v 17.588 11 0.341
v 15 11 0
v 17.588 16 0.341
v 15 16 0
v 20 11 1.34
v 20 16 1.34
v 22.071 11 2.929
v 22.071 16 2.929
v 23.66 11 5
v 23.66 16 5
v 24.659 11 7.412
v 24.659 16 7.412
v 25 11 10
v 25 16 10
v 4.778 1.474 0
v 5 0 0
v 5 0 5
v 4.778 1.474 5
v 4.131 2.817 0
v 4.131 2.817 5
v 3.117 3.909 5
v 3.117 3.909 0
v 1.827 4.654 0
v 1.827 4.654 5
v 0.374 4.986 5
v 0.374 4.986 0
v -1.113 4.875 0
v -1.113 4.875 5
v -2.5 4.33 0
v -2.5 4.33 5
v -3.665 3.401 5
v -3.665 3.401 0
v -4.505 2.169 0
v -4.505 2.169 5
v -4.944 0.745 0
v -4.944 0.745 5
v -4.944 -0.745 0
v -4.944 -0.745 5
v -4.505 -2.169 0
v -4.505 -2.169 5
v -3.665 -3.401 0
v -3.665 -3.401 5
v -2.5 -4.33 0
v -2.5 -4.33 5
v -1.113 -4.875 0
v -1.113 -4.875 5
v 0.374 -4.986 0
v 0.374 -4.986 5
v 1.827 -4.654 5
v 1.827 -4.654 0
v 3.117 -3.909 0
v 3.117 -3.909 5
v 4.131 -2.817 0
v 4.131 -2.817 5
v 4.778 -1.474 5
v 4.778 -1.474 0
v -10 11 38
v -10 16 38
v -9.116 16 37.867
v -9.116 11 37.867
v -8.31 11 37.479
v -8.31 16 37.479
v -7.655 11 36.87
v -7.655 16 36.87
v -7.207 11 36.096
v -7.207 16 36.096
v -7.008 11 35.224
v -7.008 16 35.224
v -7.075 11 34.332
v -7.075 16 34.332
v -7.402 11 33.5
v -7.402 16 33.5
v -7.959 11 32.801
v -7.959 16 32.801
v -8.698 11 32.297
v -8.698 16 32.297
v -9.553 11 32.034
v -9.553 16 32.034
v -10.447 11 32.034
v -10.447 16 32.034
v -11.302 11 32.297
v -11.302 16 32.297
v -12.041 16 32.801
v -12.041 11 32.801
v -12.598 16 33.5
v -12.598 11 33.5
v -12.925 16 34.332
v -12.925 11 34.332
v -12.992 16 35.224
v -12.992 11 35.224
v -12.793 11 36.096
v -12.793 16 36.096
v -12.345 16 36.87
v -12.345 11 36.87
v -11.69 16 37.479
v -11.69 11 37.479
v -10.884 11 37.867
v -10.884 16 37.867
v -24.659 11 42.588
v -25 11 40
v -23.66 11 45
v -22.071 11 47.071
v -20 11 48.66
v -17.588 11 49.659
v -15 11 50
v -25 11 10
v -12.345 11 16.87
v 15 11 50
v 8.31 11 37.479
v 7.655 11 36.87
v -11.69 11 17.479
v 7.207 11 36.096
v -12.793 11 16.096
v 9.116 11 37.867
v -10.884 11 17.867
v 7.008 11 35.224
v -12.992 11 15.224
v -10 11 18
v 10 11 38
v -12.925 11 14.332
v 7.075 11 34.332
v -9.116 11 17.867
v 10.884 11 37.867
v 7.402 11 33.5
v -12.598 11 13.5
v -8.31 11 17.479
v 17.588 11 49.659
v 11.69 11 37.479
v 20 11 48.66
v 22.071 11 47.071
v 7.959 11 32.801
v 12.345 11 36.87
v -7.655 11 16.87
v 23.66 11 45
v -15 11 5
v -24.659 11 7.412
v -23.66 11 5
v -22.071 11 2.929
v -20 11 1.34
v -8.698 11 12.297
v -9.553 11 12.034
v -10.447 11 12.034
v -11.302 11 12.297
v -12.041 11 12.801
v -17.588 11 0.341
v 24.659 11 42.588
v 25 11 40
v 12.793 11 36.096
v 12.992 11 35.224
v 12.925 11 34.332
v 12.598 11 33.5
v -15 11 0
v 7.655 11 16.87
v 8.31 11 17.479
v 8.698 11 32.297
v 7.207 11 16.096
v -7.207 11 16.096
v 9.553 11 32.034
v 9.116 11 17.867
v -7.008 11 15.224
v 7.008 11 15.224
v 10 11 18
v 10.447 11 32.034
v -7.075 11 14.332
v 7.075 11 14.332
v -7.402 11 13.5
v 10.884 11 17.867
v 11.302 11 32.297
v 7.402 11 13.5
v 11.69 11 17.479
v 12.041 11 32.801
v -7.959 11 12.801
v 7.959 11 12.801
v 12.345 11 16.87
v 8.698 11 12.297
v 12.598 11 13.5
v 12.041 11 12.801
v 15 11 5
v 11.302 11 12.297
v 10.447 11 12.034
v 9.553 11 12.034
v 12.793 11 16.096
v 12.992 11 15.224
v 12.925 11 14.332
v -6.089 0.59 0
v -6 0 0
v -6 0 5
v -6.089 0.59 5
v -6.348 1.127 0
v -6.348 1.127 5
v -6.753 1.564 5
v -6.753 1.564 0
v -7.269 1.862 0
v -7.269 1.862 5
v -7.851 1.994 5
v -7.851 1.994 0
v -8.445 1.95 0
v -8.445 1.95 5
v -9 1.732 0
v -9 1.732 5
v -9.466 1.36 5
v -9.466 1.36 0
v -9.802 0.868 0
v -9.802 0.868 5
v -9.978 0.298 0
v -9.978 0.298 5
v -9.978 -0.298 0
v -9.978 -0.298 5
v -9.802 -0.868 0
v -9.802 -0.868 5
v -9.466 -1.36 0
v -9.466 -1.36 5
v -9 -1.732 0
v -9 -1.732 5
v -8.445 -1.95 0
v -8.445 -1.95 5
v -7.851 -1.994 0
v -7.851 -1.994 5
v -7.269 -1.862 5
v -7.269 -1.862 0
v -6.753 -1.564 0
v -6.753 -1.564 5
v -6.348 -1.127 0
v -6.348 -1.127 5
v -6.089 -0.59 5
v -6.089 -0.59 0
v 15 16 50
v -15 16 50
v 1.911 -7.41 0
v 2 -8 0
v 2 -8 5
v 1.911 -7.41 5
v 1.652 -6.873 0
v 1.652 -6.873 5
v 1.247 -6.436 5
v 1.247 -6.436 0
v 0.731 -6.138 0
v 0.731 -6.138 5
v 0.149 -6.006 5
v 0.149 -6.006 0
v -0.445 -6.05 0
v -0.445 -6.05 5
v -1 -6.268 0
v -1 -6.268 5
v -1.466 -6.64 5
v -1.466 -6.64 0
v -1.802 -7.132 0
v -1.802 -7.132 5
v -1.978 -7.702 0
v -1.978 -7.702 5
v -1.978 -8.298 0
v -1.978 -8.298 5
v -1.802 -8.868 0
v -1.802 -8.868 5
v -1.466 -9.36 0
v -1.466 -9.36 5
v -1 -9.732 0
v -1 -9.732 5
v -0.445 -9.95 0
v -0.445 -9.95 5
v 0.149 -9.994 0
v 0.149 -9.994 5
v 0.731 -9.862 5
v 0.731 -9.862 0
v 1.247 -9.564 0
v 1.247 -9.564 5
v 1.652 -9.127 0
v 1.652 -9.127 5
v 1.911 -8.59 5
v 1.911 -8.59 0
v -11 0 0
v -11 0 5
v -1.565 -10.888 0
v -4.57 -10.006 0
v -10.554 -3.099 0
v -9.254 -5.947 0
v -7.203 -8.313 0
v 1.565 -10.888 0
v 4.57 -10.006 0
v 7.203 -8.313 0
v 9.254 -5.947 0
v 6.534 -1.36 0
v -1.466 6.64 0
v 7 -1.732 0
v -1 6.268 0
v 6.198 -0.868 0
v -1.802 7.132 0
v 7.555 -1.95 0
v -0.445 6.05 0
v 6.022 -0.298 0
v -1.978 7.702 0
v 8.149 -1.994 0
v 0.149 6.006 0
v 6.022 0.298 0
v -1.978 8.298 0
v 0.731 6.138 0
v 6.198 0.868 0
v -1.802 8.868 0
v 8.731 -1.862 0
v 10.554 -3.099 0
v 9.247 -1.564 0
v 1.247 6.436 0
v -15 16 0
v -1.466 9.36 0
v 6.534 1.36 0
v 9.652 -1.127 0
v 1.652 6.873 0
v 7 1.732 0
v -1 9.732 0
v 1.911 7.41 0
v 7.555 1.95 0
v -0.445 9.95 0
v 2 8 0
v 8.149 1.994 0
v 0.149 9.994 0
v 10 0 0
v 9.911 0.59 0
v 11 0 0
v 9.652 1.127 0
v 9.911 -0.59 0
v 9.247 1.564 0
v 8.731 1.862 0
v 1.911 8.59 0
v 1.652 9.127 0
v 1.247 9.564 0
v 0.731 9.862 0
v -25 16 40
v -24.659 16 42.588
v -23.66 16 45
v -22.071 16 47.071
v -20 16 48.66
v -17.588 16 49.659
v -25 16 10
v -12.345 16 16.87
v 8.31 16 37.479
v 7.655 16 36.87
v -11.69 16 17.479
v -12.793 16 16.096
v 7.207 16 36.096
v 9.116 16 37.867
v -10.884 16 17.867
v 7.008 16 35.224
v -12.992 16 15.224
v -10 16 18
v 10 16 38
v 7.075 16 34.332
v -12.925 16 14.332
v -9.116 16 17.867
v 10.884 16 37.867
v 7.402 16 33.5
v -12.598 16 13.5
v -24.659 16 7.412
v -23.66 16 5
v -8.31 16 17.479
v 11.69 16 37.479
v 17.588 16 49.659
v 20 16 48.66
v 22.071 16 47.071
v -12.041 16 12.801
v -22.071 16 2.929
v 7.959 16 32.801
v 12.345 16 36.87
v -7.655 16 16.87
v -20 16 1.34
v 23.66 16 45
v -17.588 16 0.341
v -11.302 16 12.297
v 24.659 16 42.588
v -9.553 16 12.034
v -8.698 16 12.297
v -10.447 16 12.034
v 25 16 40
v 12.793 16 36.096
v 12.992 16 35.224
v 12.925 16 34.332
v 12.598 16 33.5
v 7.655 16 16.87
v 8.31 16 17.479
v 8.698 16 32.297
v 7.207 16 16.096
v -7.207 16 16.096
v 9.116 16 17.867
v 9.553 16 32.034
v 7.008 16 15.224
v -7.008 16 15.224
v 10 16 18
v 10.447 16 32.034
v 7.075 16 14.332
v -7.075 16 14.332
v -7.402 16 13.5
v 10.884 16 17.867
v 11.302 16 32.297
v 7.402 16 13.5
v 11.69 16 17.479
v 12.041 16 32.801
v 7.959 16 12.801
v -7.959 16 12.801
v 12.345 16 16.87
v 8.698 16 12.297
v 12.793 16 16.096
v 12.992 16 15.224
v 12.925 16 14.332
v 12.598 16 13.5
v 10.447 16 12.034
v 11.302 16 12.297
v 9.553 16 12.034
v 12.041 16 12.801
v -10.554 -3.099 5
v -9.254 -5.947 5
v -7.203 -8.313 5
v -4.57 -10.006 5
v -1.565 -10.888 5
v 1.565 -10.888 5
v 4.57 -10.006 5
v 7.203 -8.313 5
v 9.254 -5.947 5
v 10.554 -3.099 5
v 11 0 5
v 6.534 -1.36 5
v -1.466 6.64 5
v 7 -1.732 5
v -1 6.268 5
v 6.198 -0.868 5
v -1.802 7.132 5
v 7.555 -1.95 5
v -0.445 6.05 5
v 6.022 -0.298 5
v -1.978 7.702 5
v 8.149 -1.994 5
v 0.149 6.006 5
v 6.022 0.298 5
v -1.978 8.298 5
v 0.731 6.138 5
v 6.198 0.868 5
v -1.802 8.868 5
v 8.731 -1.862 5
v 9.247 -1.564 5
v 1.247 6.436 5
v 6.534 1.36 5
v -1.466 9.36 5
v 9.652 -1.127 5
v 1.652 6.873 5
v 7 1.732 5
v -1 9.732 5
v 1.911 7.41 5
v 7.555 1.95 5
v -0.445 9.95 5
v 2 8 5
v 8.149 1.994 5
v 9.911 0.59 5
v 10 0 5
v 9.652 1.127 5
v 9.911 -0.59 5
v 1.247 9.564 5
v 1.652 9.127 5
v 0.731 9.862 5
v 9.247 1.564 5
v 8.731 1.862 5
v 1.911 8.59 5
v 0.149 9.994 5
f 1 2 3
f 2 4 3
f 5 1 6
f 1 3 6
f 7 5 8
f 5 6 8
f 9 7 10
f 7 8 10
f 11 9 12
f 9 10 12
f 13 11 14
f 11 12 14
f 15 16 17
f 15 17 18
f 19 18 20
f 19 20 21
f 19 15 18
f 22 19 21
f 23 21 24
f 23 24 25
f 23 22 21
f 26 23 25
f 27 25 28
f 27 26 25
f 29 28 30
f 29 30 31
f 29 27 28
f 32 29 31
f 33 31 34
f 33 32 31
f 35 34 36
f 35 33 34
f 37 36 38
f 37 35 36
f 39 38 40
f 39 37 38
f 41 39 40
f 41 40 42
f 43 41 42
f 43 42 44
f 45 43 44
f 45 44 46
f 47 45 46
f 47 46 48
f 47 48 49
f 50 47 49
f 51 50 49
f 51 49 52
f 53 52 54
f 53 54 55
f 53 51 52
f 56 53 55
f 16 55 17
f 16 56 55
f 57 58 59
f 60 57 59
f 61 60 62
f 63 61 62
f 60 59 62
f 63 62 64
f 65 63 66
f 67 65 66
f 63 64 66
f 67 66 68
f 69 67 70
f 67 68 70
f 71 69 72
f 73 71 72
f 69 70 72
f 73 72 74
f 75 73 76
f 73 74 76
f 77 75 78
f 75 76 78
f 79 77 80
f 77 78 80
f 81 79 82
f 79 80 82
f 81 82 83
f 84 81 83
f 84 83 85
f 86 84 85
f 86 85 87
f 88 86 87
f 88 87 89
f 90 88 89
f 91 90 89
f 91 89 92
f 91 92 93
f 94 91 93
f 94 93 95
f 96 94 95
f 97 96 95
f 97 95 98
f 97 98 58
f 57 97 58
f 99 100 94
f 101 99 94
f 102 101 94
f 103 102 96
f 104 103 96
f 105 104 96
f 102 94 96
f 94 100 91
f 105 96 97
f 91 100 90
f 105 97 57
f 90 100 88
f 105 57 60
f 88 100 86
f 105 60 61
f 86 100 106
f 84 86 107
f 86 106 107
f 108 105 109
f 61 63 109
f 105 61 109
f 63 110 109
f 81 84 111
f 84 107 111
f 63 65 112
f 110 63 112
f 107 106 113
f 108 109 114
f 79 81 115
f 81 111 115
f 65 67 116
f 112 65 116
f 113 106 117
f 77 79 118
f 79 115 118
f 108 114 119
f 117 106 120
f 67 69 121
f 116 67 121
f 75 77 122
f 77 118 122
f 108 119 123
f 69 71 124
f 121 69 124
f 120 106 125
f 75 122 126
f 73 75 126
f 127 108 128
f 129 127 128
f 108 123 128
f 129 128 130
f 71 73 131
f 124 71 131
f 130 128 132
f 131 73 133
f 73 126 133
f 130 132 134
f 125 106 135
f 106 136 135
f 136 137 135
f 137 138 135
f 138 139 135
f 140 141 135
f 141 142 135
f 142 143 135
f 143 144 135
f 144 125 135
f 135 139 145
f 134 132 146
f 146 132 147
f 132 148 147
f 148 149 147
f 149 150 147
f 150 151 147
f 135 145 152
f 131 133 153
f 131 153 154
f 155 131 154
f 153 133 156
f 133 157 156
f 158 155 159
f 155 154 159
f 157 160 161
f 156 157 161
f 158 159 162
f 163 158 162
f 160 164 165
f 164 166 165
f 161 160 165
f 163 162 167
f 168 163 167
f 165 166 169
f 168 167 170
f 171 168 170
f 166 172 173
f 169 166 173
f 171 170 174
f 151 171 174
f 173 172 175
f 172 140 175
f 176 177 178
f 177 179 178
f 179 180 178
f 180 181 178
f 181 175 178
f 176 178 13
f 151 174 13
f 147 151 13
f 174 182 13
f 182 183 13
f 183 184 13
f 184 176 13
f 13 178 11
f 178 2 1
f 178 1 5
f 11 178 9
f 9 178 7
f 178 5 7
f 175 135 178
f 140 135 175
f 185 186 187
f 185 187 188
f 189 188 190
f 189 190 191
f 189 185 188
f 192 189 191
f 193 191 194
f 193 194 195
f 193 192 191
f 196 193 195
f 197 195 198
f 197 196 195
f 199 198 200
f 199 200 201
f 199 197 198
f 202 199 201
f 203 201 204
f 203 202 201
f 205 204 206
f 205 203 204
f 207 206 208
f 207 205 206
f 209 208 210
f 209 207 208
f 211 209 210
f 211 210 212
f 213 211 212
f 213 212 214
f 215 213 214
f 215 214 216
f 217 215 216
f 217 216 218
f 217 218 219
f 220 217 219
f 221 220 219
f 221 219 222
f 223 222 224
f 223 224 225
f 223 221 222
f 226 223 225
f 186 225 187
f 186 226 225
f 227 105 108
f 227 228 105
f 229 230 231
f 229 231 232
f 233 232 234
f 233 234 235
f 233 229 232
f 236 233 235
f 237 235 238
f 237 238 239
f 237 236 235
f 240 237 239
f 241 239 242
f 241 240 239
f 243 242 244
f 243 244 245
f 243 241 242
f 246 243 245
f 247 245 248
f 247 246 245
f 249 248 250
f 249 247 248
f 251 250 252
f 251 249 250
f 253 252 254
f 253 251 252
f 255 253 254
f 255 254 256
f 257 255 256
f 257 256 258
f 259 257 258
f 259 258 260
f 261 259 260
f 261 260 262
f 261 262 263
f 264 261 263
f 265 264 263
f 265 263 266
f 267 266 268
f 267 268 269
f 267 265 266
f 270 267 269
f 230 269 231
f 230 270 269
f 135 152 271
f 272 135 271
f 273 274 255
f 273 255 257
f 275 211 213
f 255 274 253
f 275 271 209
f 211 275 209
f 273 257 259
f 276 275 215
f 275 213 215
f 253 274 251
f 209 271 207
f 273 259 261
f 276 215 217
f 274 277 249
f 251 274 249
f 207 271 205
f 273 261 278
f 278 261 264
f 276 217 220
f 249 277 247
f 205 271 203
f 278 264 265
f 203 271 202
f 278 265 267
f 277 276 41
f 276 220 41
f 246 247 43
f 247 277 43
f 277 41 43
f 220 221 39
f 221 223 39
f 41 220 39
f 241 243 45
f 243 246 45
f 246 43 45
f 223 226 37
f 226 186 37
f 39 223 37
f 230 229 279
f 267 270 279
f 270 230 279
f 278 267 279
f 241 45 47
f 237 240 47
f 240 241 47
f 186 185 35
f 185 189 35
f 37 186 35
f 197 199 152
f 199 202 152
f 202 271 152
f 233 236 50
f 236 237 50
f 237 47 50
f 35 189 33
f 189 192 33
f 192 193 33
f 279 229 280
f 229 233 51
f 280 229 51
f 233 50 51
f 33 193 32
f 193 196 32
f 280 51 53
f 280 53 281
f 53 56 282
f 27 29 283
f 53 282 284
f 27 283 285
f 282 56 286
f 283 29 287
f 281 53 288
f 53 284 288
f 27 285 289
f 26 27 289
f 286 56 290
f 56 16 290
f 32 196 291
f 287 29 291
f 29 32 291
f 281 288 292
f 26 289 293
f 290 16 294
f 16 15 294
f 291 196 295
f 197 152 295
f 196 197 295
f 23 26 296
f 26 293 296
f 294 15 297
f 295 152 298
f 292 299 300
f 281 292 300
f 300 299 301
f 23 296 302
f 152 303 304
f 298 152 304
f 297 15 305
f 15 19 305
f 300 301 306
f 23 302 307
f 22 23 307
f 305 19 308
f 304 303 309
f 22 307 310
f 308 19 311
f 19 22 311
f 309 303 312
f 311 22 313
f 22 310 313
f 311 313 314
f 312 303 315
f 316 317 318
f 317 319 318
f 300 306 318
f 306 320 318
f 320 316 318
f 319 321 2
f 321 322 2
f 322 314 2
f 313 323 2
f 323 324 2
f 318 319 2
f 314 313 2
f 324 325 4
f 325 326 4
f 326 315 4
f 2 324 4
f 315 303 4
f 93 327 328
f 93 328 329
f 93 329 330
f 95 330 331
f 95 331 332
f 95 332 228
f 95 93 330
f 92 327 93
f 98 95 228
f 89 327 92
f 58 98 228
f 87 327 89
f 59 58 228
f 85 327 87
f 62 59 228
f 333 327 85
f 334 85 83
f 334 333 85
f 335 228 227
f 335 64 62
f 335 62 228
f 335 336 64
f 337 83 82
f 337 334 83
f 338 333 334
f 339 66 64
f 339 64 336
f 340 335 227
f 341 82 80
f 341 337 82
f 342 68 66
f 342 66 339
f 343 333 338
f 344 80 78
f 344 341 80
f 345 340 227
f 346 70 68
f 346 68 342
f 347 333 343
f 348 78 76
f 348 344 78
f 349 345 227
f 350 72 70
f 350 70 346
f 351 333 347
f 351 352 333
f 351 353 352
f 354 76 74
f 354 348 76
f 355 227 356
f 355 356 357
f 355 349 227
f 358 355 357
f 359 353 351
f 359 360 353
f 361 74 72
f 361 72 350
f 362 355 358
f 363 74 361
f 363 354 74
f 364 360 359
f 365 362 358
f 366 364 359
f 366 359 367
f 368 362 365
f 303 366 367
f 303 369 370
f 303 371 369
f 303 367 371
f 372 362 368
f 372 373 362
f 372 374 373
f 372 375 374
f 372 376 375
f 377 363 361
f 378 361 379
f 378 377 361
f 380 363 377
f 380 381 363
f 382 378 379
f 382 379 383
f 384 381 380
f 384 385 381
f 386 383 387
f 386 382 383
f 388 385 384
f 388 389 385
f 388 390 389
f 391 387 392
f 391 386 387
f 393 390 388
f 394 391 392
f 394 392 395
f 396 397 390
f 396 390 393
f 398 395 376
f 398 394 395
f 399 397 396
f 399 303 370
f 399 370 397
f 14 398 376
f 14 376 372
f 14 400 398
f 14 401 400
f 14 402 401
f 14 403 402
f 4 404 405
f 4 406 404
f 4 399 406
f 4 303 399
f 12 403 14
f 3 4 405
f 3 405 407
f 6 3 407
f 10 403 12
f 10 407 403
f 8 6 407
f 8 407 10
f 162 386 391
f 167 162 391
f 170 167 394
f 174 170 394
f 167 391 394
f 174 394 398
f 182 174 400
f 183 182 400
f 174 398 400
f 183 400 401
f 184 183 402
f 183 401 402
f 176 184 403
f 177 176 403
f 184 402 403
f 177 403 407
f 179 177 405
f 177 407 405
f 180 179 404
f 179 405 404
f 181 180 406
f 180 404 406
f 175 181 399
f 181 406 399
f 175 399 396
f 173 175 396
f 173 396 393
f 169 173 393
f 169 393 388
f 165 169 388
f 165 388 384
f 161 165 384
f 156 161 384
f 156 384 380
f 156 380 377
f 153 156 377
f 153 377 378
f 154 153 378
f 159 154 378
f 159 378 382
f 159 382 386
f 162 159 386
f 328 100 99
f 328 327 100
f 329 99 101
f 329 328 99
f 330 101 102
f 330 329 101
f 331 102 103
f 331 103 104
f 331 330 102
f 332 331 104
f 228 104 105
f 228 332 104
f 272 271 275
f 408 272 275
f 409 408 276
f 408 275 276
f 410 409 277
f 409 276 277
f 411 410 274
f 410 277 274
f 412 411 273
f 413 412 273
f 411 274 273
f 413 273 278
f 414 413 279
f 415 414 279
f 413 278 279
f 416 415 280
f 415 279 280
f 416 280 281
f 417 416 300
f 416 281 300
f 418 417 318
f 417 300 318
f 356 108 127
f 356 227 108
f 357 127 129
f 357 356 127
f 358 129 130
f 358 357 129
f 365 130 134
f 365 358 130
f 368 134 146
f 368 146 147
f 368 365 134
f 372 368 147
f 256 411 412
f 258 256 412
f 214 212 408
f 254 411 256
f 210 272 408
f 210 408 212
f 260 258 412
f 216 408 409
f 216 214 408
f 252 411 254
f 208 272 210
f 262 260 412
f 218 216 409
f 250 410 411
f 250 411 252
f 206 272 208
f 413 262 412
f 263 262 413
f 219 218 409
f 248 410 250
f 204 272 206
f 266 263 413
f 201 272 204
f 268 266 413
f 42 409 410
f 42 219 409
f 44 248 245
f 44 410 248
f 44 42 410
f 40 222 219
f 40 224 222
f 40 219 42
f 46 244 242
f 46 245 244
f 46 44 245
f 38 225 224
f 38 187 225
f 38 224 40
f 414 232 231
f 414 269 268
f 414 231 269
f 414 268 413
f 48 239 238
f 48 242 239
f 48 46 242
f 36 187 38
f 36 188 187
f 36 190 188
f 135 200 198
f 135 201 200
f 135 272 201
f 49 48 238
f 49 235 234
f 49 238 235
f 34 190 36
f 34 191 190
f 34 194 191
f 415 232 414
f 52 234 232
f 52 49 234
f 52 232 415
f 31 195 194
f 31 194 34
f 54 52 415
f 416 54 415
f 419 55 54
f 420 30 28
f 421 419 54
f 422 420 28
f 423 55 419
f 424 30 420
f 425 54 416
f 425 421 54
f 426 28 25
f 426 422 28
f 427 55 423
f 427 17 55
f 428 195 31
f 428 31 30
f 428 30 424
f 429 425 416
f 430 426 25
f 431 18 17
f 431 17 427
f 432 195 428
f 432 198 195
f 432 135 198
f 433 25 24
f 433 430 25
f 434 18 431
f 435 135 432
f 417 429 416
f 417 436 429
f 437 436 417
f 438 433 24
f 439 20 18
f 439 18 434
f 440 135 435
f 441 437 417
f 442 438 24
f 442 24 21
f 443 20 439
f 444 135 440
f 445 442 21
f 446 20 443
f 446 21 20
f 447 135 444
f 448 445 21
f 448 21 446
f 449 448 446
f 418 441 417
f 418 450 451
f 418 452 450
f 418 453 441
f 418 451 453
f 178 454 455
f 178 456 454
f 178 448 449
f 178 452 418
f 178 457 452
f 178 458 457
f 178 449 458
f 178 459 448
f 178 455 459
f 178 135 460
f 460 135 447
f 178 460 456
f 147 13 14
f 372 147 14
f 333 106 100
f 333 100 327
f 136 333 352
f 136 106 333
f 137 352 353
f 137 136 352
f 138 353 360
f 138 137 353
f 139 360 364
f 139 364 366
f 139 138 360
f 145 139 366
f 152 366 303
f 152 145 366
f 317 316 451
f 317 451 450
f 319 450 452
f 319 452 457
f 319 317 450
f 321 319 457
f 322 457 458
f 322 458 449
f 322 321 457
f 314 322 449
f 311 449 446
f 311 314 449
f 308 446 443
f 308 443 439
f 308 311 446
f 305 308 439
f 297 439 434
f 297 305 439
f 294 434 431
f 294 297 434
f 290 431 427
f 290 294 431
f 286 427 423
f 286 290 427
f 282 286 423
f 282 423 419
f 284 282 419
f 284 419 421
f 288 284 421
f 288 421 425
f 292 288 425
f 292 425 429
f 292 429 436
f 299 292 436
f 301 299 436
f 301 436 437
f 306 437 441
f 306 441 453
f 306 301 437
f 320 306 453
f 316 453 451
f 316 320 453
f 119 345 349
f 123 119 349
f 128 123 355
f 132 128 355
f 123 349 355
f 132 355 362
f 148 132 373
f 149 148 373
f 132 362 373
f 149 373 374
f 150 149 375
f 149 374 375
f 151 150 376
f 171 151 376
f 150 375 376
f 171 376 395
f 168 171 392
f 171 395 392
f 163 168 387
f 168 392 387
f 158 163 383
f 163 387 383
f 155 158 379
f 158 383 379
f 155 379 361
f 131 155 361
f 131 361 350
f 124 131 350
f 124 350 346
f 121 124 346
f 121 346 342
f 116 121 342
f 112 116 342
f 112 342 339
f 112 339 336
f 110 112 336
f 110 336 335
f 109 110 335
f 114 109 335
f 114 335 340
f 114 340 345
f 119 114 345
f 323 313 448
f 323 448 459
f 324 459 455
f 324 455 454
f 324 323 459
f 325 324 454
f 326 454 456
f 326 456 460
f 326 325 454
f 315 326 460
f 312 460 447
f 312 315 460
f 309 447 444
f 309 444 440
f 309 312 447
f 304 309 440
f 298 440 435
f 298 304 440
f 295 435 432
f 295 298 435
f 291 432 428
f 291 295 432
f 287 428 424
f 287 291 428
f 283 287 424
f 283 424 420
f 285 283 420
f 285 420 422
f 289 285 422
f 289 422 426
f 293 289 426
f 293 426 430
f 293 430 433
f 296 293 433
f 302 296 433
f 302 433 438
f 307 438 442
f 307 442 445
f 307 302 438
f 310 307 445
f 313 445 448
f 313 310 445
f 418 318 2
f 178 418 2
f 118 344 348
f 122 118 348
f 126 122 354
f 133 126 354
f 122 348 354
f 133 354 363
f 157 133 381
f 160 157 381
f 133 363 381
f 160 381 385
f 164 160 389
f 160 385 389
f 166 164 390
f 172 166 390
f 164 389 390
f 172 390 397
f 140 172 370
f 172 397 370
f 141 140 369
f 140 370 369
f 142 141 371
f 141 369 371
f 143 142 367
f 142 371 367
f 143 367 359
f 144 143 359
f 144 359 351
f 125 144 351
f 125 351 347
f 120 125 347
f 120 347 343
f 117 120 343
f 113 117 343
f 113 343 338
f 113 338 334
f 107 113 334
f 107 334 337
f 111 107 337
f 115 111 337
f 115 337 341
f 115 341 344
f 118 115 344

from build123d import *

# Parameters (mm, degrees)
SKETCH1_R           = 2
SKETCH1_R_2         = 5
BOSS_EXTRUDE2_DEPTH = 5
BOSS_EXTRUDE4_DEPTH = 5
SKETCH2_W           = 50
SKETCH2_H           = 5
BOSS_EXTRUDE7_DEPTH = 45
CUT_EXTRUDE1_REACH  = 64.081
SKETCH3_R           = 3
FILLET1_R           = 10


with BuildPart() as part:
    # Sketch1 → Boss-Extrude2 (new body)
    with BuildSketch(Plane.XY):
        with BuildLine():
            ThreePointArc((11, 0), (0, 11), (-11, 0))
            ThreePointArc((-11, 0), (0, -11), (11, 0))
        make_face()
        with Locations((-8, 0)):
            Circle(SKETCH1_R, mode=Mode.SUBTRACT)
        with Locations((0, -8)):
            Circle(SKETCH1_R, mode=Mode.SUBTRACT)
        Circle(SKETCH1_R_2, mode=Mode.SUBTRACT)
        with Locations((8, 0)):
            Circle(SKETCH1_R, mode=Mode.SUBTRACT)
        with Locations((0, 8)):
            Circle(SKETCH1_R, mode=Mode.SUBTRACT)
    extrude(amount=BOSS_EXTRUDE2_DEPTH)

    # Sketch1<9> → Boss-Extrude4 (add)
    with BuildSketch(Plane.XY):
        with BuildLine():
            Line((-25, 16), (-25, 11))
            Line((-25, 11), (-15, 11))
            Line((-15, 11), (-11, 0))
            ThreePointArc((-11, 0), (0, 11), (11, 0))
            Line((11, 0), (15, 11))
            Line((15, 11), (25, 11))
            Line((25, 11), (25, 16))
            Line((25, 16), (-25, 16))
        make_face()
    extrude(amount=BOSS_EXTRUDE4_DEPTH)

    # Sketch2 → Boss-Extrude7 (add)
    with BuildSketch(Plane.XY.offset(5)):
        with Locations((0, 13.5)):
            Rectangle(SKETCH2_W, SKETCH2_H)
    extrude(amount=BOSS_EXTRUDE7_DEPTH)

    # Sketch3 → Cut-Extrude1 (cut, up to next)
    with BuildSketch(Plane(origin=(0, 16, 0), x_dir=(1, 0, 0), z_dir=(0, 1, 0)), mode=Mode.PRIVATE) as cut_extrude1_sk1:
        with Locations((10, -35)):
            Circle(SKETCH3_R)
    cut_extrude1_tool1 = extrude(cut_extrude1_sk1.sketch, amount=-CUT_EXTRUDE1_REACH, mode=Mode.PRIVATE) & part.part
    # Sketch3 → Cut-Extrude1 (cut, up to next)
    with BuildSketch(Plane(origin=(0, 16, 0), x_dir=(1, 0, 0), z_dir=(0, 1, 0)), mode=Mode.PRIVATE) as cut_extrude1_sk2:
        with Locations((-10, -35)):
            Circle(SKETCH3_R)
    cut_extrude1_tool2 = extrude(cut_extrude1_sk2.sketch, amount=-CUT_EXTRUDE1_REACH, mode=Mode.PRIVATE) & part.part
    # Sketch3 → Cut-Extrude1 (cut, up to next)
    with BuildSketch(Plane(origin=(0, 16, 0), x_dir=(1, 0, 0), z_dir=(0, 1, 0)), mode=Mode.PRIVATE) as cut_extrude1_sk3:
        with Locations((-10, -15)):
            Circle(SKETCH3_R)
    cut_extrude1_tool3 = extrude(cut_extrude1_sk3.sketch, amount=-CUT_EXTRUDE1_REACH, mode=Mode.PRIVATE) & part.part
    # Sketch3 → Cut-Extrude1 (cut, up to next)
    with BuildSketch(Plane(origin=(0, 16, 0), x_dir=(1, 0, 0), z_dir=(0, 1, 0)), mode=Mode.PRIVATE) as cut_extrude1_sk4:
        with Locations((10, -15)):
            Circle(SKETCH3_R)
    cut_extrude1_tool4 = extrude(cut_extrude1_sk4.sketch, amount=-CUT_EXTRUDE1_REACH, mode=Mode.PRIVATE) & part.part
    add(cut_extrude1_tool1.solids().sort_by_distance((10, 16, 35))[0], mode=Mode.SUBTRACT)
    add(cut_extrude1_tool2.solids().sort_by_distance((-10, 16, 35))[0], mode=Mode.SUBTRACT)
    add(cut_extrude1_tool3.solids().sort_by_distance((-10, 16, 15))[0], mode=Mode.SUBTRACT)
    add(cut_extrude1_tool4.solids().sort_by_distance((10, 16, 15))[0], mode=Mode.SUBTRACT)

    # Fillet1
    fillet1_edges = [part.edges().sort_by_distance(p)[0] for p in [
        (25, 13.5, 0),
        (-25, 13.5, 0),
        (-25, 13.5, 50),
        (25, 13.5, 50),
    ]]
    fillet(fillet1_edges, radius=FILLET1_R)


solid = part.part
